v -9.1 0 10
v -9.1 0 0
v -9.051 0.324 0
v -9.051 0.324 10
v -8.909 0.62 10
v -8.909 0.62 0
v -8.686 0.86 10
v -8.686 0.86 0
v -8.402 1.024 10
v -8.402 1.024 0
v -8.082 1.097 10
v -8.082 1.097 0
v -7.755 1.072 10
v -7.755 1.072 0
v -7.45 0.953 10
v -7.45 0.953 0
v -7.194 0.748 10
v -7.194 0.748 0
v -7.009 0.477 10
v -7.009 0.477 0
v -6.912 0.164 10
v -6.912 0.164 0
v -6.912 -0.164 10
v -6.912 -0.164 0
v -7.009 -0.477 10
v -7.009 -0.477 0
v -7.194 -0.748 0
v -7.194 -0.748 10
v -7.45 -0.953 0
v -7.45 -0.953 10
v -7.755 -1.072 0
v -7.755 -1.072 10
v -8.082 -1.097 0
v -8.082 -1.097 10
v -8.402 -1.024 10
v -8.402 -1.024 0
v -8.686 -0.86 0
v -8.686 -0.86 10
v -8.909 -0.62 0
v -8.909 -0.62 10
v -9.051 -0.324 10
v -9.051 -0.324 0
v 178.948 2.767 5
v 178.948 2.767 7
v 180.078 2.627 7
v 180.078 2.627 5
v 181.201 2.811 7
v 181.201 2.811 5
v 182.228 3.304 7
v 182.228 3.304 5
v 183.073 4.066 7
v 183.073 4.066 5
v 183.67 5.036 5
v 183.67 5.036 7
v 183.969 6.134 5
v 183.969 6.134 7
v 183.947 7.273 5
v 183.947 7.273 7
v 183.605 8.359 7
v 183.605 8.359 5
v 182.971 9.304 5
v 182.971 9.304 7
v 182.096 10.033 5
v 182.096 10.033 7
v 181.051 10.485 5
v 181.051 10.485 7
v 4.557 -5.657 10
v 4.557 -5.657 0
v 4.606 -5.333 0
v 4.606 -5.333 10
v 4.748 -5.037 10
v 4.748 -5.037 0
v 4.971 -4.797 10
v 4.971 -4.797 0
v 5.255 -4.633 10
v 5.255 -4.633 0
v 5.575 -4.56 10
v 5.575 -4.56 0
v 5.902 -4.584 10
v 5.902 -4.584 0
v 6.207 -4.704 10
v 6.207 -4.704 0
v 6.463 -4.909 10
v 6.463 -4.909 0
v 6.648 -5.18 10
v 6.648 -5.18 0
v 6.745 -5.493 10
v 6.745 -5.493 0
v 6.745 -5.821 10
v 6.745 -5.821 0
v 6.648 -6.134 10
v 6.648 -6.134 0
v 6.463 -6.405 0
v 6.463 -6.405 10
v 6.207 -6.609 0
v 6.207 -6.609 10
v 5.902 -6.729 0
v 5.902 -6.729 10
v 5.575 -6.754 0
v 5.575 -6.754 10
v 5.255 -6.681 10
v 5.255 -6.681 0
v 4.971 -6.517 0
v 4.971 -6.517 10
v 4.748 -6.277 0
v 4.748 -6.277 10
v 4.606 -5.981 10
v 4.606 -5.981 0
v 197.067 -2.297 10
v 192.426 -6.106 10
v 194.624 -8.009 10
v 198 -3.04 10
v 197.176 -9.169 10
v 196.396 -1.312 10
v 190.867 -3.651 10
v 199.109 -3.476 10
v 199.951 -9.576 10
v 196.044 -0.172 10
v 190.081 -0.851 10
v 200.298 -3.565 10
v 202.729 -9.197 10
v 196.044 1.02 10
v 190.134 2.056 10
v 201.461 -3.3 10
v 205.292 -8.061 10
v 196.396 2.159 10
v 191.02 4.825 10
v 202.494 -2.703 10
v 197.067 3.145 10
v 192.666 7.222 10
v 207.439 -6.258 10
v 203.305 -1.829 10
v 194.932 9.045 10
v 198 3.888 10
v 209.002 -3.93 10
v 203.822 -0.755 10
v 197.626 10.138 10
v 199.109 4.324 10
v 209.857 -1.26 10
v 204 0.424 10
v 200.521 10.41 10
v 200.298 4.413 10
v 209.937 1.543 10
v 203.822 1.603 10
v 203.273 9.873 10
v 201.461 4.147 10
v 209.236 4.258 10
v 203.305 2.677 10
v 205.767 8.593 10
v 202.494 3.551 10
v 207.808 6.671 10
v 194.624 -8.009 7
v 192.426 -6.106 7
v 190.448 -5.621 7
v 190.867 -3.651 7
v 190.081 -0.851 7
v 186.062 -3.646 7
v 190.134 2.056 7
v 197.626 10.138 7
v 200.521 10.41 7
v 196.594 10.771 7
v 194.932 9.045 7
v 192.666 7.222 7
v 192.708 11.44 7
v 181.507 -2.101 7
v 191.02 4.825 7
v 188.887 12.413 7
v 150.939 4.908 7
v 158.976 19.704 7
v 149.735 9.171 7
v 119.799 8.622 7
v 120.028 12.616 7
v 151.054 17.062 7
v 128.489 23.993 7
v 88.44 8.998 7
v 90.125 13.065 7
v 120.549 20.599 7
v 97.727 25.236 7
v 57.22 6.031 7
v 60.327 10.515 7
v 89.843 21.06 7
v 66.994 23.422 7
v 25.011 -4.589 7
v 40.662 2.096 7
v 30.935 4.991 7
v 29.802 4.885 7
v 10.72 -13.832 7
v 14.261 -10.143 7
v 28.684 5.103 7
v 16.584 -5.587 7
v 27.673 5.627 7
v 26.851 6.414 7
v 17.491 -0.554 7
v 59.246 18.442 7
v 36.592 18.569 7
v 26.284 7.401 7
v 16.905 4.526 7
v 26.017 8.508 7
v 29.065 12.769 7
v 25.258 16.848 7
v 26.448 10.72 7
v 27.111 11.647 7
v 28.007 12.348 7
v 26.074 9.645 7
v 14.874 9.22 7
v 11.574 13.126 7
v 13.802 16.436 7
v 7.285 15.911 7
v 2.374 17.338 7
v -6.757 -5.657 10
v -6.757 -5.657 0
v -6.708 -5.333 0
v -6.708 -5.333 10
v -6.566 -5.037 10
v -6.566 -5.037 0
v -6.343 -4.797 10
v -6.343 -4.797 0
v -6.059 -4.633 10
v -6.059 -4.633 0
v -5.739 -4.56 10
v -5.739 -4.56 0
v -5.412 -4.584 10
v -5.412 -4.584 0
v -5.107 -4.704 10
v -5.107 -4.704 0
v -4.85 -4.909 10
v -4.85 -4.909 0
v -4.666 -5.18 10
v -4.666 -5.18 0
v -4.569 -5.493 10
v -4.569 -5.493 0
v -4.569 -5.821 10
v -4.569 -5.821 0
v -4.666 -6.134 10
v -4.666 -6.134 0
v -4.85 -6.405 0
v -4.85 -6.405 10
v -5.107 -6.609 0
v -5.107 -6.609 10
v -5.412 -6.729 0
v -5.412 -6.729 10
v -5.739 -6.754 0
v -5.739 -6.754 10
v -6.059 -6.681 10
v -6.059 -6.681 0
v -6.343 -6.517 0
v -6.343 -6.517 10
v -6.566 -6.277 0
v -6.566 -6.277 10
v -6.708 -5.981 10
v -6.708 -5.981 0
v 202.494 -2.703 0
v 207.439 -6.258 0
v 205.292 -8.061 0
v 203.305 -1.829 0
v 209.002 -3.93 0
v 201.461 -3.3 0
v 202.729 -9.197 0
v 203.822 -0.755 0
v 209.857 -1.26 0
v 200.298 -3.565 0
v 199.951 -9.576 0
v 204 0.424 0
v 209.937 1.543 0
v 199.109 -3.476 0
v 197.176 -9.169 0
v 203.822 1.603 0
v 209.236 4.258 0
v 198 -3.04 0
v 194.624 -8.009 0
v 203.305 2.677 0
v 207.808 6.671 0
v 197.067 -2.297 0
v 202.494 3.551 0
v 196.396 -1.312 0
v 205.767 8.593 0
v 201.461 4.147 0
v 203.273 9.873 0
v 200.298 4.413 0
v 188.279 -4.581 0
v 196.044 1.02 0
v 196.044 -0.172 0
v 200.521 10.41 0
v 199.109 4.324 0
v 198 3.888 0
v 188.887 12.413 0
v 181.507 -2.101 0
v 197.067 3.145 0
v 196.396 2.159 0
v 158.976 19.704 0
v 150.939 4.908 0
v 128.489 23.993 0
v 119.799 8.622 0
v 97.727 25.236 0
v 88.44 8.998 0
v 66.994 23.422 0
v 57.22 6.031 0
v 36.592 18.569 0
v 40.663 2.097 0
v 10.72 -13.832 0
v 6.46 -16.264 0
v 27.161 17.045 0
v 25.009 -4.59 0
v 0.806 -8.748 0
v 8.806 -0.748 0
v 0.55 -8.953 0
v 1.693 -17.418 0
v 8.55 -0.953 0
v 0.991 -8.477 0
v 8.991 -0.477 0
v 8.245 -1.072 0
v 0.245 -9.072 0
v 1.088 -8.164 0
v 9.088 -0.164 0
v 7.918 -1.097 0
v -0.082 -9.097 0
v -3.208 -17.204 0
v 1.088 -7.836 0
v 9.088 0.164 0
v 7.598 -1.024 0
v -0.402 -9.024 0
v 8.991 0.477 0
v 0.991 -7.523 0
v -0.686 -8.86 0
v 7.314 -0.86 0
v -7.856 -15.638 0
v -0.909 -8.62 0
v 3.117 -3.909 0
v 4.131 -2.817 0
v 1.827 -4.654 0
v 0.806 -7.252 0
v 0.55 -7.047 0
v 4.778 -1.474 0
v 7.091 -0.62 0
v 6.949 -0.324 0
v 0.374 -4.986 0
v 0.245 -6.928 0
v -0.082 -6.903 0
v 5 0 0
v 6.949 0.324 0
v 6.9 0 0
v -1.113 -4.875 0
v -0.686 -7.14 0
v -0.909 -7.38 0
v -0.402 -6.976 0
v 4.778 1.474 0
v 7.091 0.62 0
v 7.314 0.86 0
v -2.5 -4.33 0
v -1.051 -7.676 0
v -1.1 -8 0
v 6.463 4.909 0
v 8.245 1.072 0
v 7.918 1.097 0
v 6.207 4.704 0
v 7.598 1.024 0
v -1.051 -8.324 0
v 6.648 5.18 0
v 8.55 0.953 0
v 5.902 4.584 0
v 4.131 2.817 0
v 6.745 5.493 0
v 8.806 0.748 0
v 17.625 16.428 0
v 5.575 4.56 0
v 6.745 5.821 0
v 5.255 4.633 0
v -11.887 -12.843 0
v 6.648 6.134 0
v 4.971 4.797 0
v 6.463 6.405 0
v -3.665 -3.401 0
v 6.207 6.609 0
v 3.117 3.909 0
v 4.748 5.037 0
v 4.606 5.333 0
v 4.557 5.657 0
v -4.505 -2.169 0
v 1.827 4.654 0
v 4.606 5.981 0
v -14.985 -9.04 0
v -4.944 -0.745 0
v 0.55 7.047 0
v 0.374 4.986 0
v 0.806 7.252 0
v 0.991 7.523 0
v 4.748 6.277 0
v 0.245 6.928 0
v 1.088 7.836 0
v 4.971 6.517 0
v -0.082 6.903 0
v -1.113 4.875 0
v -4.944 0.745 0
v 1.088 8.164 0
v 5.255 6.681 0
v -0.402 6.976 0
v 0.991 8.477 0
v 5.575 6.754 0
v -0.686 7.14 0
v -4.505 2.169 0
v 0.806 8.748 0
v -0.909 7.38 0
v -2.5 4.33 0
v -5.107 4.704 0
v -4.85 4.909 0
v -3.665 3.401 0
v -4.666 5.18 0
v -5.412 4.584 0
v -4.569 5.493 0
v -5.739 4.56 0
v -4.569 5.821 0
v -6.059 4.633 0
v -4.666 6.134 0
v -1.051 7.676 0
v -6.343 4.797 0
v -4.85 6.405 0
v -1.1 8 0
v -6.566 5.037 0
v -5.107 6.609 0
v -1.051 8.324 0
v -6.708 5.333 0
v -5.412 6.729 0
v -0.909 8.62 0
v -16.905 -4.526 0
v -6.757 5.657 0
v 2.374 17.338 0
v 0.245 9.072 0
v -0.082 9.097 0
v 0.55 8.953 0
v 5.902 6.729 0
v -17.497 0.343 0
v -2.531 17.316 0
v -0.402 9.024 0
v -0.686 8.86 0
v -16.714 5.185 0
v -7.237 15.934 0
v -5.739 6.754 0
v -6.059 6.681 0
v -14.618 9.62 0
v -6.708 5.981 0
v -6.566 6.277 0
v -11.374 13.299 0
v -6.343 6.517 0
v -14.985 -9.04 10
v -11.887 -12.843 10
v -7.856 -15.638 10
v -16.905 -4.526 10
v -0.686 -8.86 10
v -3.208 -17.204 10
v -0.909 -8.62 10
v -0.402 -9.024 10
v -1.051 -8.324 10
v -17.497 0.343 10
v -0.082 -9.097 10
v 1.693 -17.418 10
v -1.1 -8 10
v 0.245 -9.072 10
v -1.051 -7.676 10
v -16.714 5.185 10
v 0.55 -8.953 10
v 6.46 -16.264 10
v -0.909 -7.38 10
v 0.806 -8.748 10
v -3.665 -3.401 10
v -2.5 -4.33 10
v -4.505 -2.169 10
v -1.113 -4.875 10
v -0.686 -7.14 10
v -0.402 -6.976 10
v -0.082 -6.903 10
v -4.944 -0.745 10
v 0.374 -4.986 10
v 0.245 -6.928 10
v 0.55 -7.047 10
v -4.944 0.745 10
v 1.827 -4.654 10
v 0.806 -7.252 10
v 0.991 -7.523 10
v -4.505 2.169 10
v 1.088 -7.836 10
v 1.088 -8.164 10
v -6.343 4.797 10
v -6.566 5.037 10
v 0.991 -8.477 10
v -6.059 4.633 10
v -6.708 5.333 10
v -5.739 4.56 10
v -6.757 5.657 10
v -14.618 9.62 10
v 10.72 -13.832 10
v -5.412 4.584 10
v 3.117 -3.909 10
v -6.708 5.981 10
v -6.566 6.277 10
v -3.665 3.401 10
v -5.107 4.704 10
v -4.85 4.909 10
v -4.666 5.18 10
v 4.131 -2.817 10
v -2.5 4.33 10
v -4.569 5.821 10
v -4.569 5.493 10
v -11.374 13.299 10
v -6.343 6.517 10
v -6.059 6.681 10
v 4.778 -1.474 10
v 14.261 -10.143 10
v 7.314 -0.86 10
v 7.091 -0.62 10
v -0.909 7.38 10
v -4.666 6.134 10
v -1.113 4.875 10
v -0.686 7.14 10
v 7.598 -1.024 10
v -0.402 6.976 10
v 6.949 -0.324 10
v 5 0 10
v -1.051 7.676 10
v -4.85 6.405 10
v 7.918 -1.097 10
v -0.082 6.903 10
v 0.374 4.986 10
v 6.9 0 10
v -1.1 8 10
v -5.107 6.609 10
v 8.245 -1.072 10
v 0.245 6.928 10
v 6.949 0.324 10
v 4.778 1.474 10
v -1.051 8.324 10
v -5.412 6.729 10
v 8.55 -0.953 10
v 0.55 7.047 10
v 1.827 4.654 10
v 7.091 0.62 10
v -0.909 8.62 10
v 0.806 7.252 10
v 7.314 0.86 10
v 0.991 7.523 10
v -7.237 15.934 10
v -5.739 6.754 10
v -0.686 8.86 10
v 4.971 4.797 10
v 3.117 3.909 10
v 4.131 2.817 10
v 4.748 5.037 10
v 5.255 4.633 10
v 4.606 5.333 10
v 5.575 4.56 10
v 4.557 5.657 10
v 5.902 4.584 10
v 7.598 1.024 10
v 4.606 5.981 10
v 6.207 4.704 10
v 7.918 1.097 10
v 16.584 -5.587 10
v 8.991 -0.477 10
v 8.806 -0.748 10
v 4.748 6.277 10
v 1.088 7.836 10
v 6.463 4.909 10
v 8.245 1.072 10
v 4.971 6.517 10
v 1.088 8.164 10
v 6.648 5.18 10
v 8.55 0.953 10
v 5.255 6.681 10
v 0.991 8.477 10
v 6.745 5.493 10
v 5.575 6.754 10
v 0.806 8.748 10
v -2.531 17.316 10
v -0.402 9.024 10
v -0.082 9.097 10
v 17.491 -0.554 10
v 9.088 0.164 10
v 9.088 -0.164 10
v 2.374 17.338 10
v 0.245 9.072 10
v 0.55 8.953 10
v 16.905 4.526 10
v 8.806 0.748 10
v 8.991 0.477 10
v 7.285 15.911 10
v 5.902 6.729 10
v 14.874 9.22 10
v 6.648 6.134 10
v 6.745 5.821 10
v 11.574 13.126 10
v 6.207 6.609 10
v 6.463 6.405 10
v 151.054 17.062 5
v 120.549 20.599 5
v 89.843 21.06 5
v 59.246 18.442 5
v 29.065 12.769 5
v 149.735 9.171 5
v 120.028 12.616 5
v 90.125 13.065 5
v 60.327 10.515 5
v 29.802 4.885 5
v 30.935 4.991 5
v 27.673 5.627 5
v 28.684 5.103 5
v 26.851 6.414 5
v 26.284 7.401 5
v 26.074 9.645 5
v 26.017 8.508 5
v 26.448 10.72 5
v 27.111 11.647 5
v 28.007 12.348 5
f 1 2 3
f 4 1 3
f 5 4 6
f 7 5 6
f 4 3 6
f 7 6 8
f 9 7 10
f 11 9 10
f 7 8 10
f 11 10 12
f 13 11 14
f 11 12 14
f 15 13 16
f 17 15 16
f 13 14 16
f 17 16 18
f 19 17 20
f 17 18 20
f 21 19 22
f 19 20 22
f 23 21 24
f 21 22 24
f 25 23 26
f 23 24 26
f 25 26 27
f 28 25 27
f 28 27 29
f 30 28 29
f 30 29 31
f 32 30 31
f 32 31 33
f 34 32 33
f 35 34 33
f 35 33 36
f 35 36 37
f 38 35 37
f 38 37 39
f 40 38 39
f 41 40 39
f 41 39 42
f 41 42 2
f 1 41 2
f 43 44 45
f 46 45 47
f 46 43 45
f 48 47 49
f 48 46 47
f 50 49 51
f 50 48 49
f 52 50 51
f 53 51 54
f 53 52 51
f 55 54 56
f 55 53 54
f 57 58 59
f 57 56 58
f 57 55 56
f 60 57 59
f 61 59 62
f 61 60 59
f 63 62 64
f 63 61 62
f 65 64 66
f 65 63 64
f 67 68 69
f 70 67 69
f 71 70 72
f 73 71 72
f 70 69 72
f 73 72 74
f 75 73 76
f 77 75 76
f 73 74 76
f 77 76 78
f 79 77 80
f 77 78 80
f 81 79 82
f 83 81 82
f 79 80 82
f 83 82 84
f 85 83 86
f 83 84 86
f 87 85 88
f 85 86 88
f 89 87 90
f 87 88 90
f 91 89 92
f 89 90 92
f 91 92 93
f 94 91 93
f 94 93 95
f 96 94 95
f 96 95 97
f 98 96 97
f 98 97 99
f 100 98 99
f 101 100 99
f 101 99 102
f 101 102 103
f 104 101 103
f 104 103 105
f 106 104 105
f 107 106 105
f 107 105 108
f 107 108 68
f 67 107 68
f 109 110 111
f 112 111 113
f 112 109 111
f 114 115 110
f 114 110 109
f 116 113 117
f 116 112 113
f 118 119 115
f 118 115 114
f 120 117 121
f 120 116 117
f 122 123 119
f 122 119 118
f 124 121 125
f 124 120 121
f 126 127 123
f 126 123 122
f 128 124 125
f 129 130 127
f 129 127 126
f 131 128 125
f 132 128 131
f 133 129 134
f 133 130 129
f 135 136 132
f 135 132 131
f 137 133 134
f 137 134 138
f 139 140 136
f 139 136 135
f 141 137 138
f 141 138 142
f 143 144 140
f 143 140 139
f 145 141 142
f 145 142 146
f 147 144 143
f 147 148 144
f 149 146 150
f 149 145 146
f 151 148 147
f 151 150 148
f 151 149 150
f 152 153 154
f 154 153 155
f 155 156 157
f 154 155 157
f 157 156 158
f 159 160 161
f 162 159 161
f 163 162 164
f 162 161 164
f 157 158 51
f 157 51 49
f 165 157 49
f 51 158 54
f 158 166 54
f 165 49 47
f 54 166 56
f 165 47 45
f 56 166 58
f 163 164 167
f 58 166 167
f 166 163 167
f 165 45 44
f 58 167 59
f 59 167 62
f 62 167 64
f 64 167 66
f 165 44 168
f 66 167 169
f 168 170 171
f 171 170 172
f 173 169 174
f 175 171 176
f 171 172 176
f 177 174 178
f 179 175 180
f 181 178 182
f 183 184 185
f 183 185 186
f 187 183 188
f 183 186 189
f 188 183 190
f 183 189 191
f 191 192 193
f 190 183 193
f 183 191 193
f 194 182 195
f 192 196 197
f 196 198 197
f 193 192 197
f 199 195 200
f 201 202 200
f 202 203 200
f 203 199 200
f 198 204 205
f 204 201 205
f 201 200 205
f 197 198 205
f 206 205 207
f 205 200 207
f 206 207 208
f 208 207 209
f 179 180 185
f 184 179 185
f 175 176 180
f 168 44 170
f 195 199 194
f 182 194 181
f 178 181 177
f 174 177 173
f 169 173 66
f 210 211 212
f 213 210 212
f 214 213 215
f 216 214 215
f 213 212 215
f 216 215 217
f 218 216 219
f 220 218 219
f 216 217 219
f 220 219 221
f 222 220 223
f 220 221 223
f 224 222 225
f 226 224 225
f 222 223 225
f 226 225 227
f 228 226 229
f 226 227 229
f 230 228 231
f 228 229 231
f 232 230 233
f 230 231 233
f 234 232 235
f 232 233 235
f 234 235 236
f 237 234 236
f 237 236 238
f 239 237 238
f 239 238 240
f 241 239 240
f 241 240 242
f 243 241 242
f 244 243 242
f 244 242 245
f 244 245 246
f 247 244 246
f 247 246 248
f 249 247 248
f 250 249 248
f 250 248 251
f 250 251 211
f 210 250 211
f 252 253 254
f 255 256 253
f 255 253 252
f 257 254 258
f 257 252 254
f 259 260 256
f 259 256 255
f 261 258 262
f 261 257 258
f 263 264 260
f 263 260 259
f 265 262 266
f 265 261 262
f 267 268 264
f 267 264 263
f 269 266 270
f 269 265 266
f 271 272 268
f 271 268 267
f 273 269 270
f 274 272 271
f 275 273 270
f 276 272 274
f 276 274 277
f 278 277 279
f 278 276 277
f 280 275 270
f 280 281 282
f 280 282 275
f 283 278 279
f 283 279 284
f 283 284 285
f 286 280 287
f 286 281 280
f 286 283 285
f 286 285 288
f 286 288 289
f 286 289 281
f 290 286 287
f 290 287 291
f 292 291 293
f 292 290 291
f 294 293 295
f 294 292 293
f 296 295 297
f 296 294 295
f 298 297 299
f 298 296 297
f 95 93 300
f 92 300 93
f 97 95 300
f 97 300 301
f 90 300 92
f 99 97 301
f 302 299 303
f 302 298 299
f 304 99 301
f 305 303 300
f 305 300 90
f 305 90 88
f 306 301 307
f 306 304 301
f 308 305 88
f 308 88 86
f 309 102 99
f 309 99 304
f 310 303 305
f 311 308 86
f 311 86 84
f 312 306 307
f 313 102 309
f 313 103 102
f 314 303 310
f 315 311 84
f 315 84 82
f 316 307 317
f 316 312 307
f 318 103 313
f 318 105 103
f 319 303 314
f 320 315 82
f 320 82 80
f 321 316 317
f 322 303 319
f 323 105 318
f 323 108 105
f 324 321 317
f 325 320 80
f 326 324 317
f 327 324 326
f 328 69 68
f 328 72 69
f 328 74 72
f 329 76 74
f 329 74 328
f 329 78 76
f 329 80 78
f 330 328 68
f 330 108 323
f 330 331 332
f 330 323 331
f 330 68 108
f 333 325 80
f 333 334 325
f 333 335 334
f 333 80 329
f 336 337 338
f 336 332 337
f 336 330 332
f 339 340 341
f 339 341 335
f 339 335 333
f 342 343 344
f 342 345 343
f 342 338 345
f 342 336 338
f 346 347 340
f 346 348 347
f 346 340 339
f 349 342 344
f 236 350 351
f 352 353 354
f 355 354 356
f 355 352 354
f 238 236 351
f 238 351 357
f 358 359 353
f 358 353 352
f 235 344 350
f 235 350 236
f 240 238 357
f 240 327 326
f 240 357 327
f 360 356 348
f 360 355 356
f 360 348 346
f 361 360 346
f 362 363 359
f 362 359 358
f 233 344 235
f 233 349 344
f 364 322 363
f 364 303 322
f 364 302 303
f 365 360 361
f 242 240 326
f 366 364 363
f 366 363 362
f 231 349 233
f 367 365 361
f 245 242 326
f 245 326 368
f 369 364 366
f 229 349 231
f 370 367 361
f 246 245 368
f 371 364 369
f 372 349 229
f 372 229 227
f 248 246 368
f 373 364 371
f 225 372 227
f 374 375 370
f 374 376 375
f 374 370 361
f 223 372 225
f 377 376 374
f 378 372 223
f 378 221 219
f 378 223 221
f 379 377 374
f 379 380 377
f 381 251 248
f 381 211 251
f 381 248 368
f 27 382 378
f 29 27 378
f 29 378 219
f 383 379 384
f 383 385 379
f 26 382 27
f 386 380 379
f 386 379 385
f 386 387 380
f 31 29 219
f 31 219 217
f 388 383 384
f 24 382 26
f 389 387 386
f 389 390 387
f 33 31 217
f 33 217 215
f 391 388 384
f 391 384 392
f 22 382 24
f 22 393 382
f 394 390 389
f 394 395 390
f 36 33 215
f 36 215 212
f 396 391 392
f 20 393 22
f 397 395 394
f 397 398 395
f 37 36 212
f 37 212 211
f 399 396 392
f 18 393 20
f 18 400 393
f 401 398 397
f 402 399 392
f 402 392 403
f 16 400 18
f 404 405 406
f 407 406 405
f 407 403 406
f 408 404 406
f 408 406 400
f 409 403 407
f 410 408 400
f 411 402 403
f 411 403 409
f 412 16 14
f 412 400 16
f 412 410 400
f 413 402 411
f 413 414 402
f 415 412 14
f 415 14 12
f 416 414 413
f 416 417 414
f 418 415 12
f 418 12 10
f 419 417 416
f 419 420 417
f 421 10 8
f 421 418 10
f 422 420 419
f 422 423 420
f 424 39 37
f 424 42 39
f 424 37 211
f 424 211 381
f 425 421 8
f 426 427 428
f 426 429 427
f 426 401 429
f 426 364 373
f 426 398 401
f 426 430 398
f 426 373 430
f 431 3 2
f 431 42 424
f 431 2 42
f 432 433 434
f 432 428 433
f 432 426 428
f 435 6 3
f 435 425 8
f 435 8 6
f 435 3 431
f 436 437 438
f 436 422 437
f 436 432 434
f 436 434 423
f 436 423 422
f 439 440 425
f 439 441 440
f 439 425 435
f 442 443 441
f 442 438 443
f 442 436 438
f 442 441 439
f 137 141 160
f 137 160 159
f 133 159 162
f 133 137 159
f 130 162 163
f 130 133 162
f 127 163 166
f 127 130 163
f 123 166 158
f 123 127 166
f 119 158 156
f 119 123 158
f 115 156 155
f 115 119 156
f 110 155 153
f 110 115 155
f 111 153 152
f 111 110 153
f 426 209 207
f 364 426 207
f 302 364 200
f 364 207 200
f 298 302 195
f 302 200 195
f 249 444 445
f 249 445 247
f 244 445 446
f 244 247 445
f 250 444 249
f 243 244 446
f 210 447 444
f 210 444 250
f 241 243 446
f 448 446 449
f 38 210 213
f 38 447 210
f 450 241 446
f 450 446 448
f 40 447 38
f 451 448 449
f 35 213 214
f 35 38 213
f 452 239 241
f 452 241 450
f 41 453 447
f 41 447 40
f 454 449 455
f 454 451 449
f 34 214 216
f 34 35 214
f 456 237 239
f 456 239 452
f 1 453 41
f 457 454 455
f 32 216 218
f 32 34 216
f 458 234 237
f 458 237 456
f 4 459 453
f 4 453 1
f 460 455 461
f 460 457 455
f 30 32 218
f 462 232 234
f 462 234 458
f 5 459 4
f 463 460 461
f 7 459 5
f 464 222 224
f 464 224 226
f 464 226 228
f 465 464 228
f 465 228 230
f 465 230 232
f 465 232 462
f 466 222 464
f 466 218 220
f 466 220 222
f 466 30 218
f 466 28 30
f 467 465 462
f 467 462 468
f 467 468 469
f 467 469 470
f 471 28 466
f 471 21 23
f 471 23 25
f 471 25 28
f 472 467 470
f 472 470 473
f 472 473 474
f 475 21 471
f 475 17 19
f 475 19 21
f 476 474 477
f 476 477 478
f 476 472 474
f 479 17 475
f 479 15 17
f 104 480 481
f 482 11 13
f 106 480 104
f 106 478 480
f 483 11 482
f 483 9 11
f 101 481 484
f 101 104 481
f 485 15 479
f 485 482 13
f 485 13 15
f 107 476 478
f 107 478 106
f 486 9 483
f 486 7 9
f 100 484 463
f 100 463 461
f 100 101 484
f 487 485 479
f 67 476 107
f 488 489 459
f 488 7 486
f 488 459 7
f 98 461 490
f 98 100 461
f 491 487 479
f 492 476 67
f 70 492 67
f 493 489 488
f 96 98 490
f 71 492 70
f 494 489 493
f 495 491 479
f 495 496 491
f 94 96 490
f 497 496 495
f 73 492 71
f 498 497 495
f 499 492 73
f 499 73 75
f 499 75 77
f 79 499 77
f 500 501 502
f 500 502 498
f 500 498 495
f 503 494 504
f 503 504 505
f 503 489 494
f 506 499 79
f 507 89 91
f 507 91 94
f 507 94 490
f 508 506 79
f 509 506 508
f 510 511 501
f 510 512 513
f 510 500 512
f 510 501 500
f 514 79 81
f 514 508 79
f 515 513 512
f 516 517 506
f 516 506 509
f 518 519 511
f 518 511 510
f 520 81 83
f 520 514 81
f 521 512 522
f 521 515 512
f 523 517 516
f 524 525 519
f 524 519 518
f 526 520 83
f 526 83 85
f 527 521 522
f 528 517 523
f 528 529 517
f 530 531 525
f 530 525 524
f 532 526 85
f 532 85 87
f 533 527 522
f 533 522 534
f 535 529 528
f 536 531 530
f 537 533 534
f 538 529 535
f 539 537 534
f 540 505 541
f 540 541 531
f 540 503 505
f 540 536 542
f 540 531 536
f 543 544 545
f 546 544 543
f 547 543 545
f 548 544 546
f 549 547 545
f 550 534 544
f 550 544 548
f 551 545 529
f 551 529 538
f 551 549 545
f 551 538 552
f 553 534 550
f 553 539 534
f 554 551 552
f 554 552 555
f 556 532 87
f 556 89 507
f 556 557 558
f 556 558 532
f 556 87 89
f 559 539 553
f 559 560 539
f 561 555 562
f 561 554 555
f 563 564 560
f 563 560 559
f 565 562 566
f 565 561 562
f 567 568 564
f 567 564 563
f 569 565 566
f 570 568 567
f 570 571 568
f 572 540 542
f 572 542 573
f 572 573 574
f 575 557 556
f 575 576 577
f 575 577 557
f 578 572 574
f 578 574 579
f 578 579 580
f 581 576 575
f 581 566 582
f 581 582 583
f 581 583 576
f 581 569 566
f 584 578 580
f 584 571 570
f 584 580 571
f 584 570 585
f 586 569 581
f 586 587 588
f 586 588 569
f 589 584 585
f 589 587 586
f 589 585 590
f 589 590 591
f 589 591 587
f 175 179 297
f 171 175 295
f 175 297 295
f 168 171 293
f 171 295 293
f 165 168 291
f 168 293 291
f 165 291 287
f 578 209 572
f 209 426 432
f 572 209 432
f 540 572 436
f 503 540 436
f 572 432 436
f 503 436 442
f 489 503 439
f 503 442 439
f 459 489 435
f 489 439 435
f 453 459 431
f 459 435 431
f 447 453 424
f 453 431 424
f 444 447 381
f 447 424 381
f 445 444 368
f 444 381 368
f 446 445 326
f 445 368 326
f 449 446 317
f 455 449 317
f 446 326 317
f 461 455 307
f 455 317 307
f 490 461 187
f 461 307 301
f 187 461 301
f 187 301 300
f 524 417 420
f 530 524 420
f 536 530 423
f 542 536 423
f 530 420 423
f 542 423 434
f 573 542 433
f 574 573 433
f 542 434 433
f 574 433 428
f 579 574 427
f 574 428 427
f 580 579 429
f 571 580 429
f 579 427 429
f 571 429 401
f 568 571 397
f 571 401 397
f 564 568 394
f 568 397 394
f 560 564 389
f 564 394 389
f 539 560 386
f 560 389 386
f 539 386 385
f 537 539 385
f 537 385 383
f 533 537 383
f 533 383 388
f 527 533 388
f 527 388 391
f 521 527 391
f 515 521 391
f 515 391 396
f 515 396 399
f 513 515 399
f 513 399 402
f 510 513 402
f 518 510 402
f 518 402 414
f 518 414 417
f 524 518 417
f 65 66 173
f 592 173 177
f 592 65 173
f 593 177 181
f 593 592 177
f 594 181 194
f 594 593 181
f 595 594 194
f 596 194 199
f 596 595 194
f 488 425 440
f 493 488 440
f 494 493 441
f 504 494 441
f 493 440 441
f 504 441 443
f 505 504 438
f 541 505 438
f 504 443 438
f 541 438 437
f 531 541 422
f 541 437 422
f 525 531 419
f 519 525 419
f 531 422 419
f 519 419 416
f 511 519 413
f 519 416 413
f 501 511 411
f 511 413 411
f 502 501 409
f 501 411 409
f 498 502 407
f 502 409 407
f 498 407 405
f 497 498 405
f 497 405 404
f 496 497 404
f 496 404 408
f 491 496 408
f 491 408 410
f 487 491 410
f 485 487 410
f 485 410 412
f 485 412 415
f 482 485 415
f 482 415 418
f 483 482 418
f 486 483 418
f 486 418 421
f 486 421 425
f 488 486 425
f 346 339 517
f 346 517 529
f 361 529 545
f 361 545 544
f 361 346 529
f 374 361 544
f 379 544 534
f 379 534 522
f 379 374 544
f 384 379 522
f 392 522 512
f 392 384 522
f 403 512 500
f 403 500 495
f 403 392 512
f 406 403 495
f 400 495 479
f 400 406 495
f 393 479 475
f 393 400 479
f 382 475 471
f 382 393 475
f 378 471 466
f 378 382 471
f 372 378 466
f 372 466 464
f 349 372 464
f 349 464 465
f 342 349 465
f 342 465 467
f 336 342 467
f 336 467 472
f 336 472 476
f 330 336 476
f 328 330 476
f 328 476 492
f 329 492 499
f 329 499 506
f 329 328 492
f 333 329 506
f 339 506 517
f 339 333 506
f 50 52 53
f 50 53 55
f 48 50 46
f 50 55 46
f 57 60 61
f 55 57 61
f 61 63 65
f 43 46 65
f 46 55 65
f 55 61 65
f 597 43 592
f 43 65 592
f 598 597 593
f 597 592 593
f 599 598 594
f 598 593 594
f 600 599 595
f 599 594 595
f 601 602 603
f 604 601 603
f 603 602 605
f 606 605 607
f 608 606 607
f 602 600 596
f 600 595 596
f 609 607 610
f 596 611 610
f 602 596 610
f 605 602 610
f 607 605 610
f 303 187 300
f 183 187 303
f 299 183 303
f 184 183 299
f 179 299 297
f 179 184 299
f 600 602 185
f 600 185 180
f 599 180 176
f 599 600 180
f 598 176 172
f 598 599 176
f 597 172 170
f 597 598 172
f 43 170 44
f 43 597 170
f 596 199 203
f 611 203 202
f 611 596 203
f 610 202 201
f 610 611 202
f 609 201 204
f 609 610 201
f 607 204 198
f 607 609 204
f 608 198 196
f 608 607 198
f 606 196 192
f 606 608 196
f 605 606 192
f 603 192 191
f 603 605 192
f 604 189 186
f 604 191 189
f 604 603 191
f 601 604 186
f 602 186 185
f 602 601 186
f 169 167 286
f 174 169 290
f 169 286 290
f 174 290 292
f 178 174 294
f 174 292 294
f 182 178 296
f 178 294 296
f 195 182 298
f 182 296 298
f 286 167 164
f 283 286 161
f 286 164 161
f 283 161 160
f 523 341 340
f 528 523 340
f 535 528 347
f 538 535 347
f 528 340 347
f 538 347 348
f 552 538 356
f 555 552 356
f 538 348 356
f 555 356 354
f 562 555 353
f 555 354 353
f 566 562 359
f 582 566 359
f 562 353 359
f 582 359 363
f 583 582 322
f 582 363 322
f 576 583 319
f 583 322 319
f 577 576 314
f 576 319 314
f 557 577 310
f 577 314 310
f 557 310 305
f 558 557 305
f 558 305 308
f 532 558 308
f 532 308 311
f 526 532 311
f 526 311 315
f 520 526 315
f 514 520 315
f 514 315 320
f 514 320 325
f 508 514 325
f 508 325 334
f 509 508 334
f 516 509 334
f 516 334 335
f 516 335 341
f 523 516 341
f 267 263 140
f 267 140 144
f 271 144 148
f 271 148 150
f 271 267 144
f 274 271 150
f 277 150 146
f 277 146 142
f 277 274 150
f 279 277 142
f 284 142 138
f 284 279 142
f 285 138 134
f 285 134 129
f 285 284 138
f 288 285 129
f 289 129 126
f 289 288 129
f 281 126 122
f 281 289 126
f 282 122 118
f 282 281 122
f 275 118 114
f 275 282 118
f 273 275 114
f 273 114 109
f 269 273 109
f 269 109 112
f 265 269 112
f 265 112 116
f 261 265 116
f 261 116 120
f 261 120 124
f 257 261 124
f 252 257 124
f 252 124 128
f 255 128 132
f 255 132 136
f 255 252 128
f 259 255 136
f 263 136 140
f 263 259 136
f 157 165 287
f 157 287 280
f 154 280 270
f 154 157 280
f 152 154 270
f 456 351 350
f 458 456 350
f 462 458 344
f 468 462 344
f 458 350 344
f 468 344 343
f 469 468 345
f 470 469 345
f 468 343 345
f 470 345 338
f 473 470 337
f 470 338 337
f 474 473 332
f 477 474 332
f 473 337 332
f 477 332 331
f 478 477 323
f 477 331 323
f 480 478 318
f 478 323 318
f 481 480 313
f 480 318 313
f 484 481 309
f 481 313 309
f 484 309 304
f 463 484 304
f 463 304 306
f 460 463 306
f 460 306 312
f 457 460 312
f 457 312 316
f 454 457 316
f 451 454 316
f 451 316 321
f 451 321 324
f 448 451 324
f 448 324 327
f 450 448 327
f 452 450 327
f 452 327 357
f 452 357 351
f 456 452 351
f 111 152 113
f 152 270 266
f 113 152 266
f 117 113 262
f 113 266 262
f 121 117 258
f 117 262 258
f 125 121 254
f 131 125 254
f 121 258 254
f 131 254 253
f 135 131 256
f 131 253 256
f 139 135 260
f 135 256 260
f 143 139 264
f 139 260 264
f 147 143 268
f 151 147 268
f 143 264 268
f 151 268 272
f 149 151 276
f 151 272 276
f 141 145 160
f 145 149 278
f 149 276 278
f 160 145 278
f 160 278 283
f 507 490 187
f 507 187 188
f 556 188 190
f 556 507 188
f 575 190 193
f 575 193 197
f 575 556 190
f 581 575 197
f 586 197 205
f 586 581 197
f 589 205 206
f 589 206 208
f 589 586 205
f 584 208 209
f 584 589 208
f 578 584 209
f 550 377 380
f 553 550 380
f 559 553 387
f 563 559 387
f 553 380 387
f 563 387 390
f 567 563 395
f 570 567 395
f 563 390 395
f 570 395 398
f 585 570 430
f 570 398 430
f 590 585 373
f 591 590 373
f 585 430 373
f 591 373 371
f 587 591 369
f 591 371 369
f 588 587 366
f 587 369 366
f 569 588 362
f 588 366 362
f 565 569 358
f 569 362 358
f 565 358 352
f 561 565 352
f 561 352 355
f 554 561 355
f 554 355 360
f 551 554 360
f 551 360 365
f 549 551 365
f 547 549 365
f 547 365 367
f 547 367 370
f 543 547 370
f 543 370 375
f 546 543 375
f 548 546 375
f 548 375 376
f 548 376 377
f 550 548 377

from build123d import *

# Parameters (mm, degrees)
SKETCH1_R                = 5
SKETCH1_R_2              = 4
BOSS_EXTRUDE1_DEPTH      = 10
FILLET1_R                = 100
FILLET3_R                = 50
BOSS_EXTRUDE2_DEPTH      = 5
CUT_EXTRUDE1_DEPTH       = 3
M2_CLEARANCE_HOLE2_D     = 2.2
M2_CLEARANCE_HOLE2_DEPTH = 10


with BuildPart() as part:
    # Sketch1 → Boss-Extrude1 (new body)
    with BuildSketch(Plane.XY):
        with BuildLine():
            ThreePointArc((12.332289397, 12.416305338), (-16.645203494, -5.40251799), (17.2733755, -2.807222621))
            ThreePointArc((17.2733755, -2.807222621), (104.699737116, 9.220908362), (191.757044964, -5.238337488))
            ThreePointArc((191.757044964, -5.238337488), (209.474645485, -2.773362317), (196.872940476, 9.922562291))
            ThreePointArc((196.872940476, 9.922562291), (104.792499107, 25.221141559), (12.332289397, 12.416305338))
        make_face()
        Circle(SKETCH1_R, mode=Mode.SUBTRACT)
        with Locations((199.999550741, 0.423914585)):
            Circle(SKETCH1_R_2, mode=Mode.SUBTRACT)
        with BuildLine():
            ThreePointArc((30.935149345, 4.991193321), (105.08187222, 13.215793431), (178.947951069, 2.766728612))
            ThreePointArc((178.947951069, 2.766728612), (183.85884318, 5.57442138), (181.051150412, 10.485313491))
            ThreePointArc((181.051150412, 10.485313491), (105.20208958, 21.214890117), (29.064850655, 12.769495373))
            ThreePointArc((29.064850655, 12.769495373), (26.110848974, 7.945195001), (30.935149345, 4.991193321))
        make_face(mode=Mode.SUBTRACT)
    extrude(amount=BOSS_EXTRUDE1_DEPTH)

    # Fillet1
    fillet1_edges = [part.edges().sort_by_distance(p)[0] for p in [
        (17.2733755, -2.807222621, 5),
        (12.332289397, 12.416305338, 5),
    ]]
    fillet(fillet1_edges, radius=FILLET1_R)

    # Fillet3
    fillet3_edges = [part.edges().sort_by_distance(p)[0] for p in [
        (196.872940476, 9.922562291, 5),
        (191.757044964, -5.238337488, 5),
    ]]
    fillet(fillet3_edges, radius=FILLET3_R)

    # Sketch2 → Boss-Extrude2 (add)
    with BuildSketch(Plane(origin=(0, 0, 0), x_dir=(-1, 0, 0), z_dir=(0, 0, -1))):
        with BuildLine():
            ThreePointArc((-30.935149345, 4.991193321), (-26.110848974, 7.945195001), (-29.064850655, 12.769495373))
            ThreePointArc((-29.064850655, 12.769495373), (-105.20208958, 21.214890117), (-181.051150412, 10.485313491))
            ThreePointArc((-181.051150412, 10.485313491), (-183.85884318, 5.57442138), (-178.947951069, 2.766728612))
            ThreePointArc((-178.947951069, 2.766728612), (-105.08187222, 13.215793431), (-30.935149345, 4.991193321))
        make_face()
    extrude(amount=-BOSS_EXTRUDE2_DEPTH)

    # Sketch3 → Cut-Extrude1 (cut)
    with BuildSketch(Plane.XY.offset(10)):
        with BuildLine():
            ThreePointArc((10.719889508, -13.832352256), (16.904607487, 4.525952466), (2.374455951, 17.338164809))
            ThreePointArc((2.374455951, 17.338164809), (19.536178227, 16.477975853), (36.591800033, 18.568526337))
            ThreePointArc((36.591800033, 18.568526337), (113.1236291, 24.996521405), (188.887012749, 12.412814518))
            ThreePointArc((188.887012749, 12.412814518), (194.644535138, 11.067035799), (200.520666376, 10.410327279))
            ThreePointArc((200.520666376, 10.410327279), (190.475667826, 3.472792121), (194.624244359, -8.008527607))
            ThreePointArc((194.624244359, -8.008527607), (188.279056755, -4.580565267), (181.506715916, -2.10110341))
            ThreePointArc((181.506715916, -2.10110341), (119.798948798, 8.622149082), (57.220022333, 6.030888954))
            ThreePointArc((57.220022333, 6.030888954), (32.693746361, -0.913106752), (10.719889508, -13.832352256))
        make_face()
    extrude(amount=-CUT_EXTRUDE1_DEPTH, mode=Mode.SUBTRACT)

    # M2 Clearance Hole2
    with Locations(Plane.XY.offset(10)):
        with Locations((0, 8), (5.656854249, 5.656854249), (8, 0), (5.656854249, -5.656854249), (0, -8), (-5.656854249, -5.656854249), (-8, 0), (-5.656854249, 5.656854249)):
            Hole(M2_CLEARANCE_HOLE2_D / 2, depth=M2_CLEARANCE_HOLE2_DEPTH)


solid = part.part
